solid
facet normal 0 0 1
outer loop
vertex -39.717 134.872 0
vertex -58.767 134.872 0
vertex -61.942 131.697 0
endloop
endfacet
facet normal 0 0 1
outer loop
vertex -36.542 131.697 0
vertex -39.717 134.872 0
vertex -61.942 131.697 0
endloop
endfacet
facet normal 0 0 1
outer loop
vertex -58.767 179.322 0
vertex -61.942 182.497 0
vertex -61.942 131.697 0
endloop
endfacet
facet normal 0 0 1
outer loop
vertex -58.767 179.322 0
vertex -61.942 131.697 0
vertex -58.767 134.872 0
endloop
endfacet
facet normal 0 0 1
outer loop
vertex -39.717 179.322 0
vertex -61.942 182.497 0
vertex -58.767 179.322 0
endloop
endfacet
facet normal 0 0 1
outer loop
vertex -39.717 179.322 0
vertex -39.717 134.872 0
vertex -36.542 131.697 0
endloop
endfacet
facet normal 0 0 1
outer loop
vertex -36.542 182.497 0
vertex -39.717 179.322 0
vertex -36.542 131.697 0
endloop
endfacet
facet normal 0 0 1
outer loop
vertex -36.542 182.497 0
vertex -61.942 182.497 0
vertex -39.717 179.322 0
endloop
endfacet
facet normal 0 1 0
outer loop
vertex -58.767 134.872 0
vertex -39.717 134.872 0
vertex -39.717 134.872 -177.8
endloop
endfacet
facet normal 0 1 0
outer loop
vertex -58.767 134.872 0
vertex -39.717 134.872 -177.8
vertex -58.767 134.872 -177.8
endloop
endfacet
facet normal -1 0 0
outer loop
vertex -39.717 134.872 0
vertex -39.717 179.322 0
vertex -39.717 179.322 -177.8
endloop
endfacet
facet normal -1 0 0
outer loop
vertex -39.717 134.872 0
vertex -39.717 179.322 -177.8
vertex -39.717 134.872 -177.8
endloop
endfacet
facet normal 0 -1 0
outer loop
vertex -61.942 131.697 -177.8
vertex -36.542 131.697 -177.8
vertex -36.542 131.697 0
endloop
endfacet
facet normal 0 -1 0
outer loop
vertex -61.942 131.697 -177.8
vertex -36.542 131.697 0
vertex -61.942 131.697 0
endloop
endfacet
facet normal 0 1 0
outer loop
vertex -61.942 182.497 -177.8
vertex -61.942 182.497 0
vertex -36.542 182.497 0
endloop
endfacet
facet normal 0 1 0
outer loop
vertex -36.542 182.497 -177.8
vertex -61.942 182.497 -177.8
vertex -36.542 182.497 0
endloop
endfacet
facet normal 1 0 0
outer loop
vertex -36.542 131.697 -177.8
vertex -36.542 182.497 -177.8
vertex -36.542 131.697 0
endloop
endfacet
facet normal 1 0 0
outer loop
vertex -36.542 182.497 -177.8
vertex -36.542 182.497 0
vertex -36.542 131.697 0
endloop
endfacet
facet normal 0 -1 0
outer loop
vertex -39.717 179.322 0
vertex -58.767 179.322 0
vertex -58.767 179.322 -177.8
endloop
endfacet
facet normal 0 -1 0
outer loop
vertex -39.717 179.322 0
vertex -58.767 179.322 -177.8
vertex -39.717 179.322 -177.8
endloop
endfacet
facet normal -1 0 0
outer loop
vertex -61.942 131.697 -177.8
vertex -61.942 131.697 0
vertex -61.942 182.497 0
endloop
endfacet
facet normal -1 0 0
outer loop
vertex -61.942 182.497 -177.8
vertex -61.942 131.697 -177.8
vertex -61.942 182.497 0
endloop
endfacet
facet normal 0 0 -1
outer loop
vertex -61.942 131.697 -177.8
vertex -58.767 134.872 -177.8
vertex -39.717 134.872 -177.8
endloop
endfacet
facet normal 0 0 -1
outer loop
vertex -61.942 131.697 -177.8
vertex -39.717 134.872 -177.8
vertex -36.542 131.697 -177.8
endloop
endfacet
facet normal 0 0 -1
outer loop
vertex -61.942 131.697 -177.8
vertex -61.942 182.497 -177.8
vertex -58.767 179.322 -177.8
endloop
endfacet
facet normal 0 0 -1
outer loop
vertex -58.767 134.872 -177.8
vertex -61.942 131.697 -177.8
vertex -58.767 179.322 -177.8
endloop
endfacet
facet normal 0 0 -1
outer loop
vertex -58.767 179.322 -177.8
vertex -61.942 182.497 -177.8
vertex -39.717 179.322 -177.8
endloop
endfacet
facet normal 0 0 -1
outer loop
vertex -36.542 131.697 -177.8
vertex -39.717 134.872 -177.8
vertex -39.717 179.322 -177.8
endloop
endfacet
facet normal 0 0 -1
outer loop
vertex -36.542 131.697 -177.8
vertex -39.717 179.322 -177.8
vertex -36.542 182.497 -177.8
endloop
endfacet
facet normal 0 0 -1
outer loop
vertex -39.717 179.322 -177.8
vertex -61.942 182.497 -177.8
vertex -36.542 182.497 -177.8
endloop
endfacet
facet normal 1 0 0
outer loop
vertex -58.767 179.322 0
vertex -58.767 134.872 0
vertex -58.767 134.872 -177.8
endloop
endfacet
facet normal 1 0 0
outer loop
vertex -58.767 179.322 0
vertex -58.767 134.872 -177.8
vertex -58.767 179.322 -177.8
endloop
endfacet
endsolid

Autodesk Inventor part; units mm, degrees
ref_plane "YZ Plane" through (0, 0, 0) normal (1, 0, 0) x (0, 1, 0)
ref_plane "XZ Plane" through (0, 0, 0) normal (0, 1, 0) x (-1, 0, 0)
ref_plane "XY Plane" through (0, 0, 0) normal (0, 0, 1) x (1, 0, 0)
sketch "Sketch1" plane through (0, 0, 0) normal (0, 0, 1) x (1, 0, 0)
  line L0 (-61.9417, 182.4966) -> (-36.5417, 182.4966)
  line L1 (-36.5417, 182.4966) -> (-36.5417, 131.6966)
  line L2 (-36.5417, 131.6966) -> (-61.9417, 131.6966)
  line L3 (-61.9417, 131.6966) -> (-61.9417, 182.4966)
  line L4 (-58.7667, 179.3216) -> (-39.7167, 179.3216)
  line L5 (-39.7167, 179.3216) -> (-39.7167, 134.8716)
  line L6 (-39.7167, 134.8716) -> (-58.7667, 134.8716)
  line L7 (-58.7667, 134.8716) -> (-58.7667, 179.3216)
  point P0 (0, 0)
  dimension "d0" = 25.4
  dimension "d1" = 50.8
  dimension "d2" = 3.175
extrude "Extrusion1" add sketch "Sketch1" against normal blind 177.8
properties part number "Motor Mount 2"
